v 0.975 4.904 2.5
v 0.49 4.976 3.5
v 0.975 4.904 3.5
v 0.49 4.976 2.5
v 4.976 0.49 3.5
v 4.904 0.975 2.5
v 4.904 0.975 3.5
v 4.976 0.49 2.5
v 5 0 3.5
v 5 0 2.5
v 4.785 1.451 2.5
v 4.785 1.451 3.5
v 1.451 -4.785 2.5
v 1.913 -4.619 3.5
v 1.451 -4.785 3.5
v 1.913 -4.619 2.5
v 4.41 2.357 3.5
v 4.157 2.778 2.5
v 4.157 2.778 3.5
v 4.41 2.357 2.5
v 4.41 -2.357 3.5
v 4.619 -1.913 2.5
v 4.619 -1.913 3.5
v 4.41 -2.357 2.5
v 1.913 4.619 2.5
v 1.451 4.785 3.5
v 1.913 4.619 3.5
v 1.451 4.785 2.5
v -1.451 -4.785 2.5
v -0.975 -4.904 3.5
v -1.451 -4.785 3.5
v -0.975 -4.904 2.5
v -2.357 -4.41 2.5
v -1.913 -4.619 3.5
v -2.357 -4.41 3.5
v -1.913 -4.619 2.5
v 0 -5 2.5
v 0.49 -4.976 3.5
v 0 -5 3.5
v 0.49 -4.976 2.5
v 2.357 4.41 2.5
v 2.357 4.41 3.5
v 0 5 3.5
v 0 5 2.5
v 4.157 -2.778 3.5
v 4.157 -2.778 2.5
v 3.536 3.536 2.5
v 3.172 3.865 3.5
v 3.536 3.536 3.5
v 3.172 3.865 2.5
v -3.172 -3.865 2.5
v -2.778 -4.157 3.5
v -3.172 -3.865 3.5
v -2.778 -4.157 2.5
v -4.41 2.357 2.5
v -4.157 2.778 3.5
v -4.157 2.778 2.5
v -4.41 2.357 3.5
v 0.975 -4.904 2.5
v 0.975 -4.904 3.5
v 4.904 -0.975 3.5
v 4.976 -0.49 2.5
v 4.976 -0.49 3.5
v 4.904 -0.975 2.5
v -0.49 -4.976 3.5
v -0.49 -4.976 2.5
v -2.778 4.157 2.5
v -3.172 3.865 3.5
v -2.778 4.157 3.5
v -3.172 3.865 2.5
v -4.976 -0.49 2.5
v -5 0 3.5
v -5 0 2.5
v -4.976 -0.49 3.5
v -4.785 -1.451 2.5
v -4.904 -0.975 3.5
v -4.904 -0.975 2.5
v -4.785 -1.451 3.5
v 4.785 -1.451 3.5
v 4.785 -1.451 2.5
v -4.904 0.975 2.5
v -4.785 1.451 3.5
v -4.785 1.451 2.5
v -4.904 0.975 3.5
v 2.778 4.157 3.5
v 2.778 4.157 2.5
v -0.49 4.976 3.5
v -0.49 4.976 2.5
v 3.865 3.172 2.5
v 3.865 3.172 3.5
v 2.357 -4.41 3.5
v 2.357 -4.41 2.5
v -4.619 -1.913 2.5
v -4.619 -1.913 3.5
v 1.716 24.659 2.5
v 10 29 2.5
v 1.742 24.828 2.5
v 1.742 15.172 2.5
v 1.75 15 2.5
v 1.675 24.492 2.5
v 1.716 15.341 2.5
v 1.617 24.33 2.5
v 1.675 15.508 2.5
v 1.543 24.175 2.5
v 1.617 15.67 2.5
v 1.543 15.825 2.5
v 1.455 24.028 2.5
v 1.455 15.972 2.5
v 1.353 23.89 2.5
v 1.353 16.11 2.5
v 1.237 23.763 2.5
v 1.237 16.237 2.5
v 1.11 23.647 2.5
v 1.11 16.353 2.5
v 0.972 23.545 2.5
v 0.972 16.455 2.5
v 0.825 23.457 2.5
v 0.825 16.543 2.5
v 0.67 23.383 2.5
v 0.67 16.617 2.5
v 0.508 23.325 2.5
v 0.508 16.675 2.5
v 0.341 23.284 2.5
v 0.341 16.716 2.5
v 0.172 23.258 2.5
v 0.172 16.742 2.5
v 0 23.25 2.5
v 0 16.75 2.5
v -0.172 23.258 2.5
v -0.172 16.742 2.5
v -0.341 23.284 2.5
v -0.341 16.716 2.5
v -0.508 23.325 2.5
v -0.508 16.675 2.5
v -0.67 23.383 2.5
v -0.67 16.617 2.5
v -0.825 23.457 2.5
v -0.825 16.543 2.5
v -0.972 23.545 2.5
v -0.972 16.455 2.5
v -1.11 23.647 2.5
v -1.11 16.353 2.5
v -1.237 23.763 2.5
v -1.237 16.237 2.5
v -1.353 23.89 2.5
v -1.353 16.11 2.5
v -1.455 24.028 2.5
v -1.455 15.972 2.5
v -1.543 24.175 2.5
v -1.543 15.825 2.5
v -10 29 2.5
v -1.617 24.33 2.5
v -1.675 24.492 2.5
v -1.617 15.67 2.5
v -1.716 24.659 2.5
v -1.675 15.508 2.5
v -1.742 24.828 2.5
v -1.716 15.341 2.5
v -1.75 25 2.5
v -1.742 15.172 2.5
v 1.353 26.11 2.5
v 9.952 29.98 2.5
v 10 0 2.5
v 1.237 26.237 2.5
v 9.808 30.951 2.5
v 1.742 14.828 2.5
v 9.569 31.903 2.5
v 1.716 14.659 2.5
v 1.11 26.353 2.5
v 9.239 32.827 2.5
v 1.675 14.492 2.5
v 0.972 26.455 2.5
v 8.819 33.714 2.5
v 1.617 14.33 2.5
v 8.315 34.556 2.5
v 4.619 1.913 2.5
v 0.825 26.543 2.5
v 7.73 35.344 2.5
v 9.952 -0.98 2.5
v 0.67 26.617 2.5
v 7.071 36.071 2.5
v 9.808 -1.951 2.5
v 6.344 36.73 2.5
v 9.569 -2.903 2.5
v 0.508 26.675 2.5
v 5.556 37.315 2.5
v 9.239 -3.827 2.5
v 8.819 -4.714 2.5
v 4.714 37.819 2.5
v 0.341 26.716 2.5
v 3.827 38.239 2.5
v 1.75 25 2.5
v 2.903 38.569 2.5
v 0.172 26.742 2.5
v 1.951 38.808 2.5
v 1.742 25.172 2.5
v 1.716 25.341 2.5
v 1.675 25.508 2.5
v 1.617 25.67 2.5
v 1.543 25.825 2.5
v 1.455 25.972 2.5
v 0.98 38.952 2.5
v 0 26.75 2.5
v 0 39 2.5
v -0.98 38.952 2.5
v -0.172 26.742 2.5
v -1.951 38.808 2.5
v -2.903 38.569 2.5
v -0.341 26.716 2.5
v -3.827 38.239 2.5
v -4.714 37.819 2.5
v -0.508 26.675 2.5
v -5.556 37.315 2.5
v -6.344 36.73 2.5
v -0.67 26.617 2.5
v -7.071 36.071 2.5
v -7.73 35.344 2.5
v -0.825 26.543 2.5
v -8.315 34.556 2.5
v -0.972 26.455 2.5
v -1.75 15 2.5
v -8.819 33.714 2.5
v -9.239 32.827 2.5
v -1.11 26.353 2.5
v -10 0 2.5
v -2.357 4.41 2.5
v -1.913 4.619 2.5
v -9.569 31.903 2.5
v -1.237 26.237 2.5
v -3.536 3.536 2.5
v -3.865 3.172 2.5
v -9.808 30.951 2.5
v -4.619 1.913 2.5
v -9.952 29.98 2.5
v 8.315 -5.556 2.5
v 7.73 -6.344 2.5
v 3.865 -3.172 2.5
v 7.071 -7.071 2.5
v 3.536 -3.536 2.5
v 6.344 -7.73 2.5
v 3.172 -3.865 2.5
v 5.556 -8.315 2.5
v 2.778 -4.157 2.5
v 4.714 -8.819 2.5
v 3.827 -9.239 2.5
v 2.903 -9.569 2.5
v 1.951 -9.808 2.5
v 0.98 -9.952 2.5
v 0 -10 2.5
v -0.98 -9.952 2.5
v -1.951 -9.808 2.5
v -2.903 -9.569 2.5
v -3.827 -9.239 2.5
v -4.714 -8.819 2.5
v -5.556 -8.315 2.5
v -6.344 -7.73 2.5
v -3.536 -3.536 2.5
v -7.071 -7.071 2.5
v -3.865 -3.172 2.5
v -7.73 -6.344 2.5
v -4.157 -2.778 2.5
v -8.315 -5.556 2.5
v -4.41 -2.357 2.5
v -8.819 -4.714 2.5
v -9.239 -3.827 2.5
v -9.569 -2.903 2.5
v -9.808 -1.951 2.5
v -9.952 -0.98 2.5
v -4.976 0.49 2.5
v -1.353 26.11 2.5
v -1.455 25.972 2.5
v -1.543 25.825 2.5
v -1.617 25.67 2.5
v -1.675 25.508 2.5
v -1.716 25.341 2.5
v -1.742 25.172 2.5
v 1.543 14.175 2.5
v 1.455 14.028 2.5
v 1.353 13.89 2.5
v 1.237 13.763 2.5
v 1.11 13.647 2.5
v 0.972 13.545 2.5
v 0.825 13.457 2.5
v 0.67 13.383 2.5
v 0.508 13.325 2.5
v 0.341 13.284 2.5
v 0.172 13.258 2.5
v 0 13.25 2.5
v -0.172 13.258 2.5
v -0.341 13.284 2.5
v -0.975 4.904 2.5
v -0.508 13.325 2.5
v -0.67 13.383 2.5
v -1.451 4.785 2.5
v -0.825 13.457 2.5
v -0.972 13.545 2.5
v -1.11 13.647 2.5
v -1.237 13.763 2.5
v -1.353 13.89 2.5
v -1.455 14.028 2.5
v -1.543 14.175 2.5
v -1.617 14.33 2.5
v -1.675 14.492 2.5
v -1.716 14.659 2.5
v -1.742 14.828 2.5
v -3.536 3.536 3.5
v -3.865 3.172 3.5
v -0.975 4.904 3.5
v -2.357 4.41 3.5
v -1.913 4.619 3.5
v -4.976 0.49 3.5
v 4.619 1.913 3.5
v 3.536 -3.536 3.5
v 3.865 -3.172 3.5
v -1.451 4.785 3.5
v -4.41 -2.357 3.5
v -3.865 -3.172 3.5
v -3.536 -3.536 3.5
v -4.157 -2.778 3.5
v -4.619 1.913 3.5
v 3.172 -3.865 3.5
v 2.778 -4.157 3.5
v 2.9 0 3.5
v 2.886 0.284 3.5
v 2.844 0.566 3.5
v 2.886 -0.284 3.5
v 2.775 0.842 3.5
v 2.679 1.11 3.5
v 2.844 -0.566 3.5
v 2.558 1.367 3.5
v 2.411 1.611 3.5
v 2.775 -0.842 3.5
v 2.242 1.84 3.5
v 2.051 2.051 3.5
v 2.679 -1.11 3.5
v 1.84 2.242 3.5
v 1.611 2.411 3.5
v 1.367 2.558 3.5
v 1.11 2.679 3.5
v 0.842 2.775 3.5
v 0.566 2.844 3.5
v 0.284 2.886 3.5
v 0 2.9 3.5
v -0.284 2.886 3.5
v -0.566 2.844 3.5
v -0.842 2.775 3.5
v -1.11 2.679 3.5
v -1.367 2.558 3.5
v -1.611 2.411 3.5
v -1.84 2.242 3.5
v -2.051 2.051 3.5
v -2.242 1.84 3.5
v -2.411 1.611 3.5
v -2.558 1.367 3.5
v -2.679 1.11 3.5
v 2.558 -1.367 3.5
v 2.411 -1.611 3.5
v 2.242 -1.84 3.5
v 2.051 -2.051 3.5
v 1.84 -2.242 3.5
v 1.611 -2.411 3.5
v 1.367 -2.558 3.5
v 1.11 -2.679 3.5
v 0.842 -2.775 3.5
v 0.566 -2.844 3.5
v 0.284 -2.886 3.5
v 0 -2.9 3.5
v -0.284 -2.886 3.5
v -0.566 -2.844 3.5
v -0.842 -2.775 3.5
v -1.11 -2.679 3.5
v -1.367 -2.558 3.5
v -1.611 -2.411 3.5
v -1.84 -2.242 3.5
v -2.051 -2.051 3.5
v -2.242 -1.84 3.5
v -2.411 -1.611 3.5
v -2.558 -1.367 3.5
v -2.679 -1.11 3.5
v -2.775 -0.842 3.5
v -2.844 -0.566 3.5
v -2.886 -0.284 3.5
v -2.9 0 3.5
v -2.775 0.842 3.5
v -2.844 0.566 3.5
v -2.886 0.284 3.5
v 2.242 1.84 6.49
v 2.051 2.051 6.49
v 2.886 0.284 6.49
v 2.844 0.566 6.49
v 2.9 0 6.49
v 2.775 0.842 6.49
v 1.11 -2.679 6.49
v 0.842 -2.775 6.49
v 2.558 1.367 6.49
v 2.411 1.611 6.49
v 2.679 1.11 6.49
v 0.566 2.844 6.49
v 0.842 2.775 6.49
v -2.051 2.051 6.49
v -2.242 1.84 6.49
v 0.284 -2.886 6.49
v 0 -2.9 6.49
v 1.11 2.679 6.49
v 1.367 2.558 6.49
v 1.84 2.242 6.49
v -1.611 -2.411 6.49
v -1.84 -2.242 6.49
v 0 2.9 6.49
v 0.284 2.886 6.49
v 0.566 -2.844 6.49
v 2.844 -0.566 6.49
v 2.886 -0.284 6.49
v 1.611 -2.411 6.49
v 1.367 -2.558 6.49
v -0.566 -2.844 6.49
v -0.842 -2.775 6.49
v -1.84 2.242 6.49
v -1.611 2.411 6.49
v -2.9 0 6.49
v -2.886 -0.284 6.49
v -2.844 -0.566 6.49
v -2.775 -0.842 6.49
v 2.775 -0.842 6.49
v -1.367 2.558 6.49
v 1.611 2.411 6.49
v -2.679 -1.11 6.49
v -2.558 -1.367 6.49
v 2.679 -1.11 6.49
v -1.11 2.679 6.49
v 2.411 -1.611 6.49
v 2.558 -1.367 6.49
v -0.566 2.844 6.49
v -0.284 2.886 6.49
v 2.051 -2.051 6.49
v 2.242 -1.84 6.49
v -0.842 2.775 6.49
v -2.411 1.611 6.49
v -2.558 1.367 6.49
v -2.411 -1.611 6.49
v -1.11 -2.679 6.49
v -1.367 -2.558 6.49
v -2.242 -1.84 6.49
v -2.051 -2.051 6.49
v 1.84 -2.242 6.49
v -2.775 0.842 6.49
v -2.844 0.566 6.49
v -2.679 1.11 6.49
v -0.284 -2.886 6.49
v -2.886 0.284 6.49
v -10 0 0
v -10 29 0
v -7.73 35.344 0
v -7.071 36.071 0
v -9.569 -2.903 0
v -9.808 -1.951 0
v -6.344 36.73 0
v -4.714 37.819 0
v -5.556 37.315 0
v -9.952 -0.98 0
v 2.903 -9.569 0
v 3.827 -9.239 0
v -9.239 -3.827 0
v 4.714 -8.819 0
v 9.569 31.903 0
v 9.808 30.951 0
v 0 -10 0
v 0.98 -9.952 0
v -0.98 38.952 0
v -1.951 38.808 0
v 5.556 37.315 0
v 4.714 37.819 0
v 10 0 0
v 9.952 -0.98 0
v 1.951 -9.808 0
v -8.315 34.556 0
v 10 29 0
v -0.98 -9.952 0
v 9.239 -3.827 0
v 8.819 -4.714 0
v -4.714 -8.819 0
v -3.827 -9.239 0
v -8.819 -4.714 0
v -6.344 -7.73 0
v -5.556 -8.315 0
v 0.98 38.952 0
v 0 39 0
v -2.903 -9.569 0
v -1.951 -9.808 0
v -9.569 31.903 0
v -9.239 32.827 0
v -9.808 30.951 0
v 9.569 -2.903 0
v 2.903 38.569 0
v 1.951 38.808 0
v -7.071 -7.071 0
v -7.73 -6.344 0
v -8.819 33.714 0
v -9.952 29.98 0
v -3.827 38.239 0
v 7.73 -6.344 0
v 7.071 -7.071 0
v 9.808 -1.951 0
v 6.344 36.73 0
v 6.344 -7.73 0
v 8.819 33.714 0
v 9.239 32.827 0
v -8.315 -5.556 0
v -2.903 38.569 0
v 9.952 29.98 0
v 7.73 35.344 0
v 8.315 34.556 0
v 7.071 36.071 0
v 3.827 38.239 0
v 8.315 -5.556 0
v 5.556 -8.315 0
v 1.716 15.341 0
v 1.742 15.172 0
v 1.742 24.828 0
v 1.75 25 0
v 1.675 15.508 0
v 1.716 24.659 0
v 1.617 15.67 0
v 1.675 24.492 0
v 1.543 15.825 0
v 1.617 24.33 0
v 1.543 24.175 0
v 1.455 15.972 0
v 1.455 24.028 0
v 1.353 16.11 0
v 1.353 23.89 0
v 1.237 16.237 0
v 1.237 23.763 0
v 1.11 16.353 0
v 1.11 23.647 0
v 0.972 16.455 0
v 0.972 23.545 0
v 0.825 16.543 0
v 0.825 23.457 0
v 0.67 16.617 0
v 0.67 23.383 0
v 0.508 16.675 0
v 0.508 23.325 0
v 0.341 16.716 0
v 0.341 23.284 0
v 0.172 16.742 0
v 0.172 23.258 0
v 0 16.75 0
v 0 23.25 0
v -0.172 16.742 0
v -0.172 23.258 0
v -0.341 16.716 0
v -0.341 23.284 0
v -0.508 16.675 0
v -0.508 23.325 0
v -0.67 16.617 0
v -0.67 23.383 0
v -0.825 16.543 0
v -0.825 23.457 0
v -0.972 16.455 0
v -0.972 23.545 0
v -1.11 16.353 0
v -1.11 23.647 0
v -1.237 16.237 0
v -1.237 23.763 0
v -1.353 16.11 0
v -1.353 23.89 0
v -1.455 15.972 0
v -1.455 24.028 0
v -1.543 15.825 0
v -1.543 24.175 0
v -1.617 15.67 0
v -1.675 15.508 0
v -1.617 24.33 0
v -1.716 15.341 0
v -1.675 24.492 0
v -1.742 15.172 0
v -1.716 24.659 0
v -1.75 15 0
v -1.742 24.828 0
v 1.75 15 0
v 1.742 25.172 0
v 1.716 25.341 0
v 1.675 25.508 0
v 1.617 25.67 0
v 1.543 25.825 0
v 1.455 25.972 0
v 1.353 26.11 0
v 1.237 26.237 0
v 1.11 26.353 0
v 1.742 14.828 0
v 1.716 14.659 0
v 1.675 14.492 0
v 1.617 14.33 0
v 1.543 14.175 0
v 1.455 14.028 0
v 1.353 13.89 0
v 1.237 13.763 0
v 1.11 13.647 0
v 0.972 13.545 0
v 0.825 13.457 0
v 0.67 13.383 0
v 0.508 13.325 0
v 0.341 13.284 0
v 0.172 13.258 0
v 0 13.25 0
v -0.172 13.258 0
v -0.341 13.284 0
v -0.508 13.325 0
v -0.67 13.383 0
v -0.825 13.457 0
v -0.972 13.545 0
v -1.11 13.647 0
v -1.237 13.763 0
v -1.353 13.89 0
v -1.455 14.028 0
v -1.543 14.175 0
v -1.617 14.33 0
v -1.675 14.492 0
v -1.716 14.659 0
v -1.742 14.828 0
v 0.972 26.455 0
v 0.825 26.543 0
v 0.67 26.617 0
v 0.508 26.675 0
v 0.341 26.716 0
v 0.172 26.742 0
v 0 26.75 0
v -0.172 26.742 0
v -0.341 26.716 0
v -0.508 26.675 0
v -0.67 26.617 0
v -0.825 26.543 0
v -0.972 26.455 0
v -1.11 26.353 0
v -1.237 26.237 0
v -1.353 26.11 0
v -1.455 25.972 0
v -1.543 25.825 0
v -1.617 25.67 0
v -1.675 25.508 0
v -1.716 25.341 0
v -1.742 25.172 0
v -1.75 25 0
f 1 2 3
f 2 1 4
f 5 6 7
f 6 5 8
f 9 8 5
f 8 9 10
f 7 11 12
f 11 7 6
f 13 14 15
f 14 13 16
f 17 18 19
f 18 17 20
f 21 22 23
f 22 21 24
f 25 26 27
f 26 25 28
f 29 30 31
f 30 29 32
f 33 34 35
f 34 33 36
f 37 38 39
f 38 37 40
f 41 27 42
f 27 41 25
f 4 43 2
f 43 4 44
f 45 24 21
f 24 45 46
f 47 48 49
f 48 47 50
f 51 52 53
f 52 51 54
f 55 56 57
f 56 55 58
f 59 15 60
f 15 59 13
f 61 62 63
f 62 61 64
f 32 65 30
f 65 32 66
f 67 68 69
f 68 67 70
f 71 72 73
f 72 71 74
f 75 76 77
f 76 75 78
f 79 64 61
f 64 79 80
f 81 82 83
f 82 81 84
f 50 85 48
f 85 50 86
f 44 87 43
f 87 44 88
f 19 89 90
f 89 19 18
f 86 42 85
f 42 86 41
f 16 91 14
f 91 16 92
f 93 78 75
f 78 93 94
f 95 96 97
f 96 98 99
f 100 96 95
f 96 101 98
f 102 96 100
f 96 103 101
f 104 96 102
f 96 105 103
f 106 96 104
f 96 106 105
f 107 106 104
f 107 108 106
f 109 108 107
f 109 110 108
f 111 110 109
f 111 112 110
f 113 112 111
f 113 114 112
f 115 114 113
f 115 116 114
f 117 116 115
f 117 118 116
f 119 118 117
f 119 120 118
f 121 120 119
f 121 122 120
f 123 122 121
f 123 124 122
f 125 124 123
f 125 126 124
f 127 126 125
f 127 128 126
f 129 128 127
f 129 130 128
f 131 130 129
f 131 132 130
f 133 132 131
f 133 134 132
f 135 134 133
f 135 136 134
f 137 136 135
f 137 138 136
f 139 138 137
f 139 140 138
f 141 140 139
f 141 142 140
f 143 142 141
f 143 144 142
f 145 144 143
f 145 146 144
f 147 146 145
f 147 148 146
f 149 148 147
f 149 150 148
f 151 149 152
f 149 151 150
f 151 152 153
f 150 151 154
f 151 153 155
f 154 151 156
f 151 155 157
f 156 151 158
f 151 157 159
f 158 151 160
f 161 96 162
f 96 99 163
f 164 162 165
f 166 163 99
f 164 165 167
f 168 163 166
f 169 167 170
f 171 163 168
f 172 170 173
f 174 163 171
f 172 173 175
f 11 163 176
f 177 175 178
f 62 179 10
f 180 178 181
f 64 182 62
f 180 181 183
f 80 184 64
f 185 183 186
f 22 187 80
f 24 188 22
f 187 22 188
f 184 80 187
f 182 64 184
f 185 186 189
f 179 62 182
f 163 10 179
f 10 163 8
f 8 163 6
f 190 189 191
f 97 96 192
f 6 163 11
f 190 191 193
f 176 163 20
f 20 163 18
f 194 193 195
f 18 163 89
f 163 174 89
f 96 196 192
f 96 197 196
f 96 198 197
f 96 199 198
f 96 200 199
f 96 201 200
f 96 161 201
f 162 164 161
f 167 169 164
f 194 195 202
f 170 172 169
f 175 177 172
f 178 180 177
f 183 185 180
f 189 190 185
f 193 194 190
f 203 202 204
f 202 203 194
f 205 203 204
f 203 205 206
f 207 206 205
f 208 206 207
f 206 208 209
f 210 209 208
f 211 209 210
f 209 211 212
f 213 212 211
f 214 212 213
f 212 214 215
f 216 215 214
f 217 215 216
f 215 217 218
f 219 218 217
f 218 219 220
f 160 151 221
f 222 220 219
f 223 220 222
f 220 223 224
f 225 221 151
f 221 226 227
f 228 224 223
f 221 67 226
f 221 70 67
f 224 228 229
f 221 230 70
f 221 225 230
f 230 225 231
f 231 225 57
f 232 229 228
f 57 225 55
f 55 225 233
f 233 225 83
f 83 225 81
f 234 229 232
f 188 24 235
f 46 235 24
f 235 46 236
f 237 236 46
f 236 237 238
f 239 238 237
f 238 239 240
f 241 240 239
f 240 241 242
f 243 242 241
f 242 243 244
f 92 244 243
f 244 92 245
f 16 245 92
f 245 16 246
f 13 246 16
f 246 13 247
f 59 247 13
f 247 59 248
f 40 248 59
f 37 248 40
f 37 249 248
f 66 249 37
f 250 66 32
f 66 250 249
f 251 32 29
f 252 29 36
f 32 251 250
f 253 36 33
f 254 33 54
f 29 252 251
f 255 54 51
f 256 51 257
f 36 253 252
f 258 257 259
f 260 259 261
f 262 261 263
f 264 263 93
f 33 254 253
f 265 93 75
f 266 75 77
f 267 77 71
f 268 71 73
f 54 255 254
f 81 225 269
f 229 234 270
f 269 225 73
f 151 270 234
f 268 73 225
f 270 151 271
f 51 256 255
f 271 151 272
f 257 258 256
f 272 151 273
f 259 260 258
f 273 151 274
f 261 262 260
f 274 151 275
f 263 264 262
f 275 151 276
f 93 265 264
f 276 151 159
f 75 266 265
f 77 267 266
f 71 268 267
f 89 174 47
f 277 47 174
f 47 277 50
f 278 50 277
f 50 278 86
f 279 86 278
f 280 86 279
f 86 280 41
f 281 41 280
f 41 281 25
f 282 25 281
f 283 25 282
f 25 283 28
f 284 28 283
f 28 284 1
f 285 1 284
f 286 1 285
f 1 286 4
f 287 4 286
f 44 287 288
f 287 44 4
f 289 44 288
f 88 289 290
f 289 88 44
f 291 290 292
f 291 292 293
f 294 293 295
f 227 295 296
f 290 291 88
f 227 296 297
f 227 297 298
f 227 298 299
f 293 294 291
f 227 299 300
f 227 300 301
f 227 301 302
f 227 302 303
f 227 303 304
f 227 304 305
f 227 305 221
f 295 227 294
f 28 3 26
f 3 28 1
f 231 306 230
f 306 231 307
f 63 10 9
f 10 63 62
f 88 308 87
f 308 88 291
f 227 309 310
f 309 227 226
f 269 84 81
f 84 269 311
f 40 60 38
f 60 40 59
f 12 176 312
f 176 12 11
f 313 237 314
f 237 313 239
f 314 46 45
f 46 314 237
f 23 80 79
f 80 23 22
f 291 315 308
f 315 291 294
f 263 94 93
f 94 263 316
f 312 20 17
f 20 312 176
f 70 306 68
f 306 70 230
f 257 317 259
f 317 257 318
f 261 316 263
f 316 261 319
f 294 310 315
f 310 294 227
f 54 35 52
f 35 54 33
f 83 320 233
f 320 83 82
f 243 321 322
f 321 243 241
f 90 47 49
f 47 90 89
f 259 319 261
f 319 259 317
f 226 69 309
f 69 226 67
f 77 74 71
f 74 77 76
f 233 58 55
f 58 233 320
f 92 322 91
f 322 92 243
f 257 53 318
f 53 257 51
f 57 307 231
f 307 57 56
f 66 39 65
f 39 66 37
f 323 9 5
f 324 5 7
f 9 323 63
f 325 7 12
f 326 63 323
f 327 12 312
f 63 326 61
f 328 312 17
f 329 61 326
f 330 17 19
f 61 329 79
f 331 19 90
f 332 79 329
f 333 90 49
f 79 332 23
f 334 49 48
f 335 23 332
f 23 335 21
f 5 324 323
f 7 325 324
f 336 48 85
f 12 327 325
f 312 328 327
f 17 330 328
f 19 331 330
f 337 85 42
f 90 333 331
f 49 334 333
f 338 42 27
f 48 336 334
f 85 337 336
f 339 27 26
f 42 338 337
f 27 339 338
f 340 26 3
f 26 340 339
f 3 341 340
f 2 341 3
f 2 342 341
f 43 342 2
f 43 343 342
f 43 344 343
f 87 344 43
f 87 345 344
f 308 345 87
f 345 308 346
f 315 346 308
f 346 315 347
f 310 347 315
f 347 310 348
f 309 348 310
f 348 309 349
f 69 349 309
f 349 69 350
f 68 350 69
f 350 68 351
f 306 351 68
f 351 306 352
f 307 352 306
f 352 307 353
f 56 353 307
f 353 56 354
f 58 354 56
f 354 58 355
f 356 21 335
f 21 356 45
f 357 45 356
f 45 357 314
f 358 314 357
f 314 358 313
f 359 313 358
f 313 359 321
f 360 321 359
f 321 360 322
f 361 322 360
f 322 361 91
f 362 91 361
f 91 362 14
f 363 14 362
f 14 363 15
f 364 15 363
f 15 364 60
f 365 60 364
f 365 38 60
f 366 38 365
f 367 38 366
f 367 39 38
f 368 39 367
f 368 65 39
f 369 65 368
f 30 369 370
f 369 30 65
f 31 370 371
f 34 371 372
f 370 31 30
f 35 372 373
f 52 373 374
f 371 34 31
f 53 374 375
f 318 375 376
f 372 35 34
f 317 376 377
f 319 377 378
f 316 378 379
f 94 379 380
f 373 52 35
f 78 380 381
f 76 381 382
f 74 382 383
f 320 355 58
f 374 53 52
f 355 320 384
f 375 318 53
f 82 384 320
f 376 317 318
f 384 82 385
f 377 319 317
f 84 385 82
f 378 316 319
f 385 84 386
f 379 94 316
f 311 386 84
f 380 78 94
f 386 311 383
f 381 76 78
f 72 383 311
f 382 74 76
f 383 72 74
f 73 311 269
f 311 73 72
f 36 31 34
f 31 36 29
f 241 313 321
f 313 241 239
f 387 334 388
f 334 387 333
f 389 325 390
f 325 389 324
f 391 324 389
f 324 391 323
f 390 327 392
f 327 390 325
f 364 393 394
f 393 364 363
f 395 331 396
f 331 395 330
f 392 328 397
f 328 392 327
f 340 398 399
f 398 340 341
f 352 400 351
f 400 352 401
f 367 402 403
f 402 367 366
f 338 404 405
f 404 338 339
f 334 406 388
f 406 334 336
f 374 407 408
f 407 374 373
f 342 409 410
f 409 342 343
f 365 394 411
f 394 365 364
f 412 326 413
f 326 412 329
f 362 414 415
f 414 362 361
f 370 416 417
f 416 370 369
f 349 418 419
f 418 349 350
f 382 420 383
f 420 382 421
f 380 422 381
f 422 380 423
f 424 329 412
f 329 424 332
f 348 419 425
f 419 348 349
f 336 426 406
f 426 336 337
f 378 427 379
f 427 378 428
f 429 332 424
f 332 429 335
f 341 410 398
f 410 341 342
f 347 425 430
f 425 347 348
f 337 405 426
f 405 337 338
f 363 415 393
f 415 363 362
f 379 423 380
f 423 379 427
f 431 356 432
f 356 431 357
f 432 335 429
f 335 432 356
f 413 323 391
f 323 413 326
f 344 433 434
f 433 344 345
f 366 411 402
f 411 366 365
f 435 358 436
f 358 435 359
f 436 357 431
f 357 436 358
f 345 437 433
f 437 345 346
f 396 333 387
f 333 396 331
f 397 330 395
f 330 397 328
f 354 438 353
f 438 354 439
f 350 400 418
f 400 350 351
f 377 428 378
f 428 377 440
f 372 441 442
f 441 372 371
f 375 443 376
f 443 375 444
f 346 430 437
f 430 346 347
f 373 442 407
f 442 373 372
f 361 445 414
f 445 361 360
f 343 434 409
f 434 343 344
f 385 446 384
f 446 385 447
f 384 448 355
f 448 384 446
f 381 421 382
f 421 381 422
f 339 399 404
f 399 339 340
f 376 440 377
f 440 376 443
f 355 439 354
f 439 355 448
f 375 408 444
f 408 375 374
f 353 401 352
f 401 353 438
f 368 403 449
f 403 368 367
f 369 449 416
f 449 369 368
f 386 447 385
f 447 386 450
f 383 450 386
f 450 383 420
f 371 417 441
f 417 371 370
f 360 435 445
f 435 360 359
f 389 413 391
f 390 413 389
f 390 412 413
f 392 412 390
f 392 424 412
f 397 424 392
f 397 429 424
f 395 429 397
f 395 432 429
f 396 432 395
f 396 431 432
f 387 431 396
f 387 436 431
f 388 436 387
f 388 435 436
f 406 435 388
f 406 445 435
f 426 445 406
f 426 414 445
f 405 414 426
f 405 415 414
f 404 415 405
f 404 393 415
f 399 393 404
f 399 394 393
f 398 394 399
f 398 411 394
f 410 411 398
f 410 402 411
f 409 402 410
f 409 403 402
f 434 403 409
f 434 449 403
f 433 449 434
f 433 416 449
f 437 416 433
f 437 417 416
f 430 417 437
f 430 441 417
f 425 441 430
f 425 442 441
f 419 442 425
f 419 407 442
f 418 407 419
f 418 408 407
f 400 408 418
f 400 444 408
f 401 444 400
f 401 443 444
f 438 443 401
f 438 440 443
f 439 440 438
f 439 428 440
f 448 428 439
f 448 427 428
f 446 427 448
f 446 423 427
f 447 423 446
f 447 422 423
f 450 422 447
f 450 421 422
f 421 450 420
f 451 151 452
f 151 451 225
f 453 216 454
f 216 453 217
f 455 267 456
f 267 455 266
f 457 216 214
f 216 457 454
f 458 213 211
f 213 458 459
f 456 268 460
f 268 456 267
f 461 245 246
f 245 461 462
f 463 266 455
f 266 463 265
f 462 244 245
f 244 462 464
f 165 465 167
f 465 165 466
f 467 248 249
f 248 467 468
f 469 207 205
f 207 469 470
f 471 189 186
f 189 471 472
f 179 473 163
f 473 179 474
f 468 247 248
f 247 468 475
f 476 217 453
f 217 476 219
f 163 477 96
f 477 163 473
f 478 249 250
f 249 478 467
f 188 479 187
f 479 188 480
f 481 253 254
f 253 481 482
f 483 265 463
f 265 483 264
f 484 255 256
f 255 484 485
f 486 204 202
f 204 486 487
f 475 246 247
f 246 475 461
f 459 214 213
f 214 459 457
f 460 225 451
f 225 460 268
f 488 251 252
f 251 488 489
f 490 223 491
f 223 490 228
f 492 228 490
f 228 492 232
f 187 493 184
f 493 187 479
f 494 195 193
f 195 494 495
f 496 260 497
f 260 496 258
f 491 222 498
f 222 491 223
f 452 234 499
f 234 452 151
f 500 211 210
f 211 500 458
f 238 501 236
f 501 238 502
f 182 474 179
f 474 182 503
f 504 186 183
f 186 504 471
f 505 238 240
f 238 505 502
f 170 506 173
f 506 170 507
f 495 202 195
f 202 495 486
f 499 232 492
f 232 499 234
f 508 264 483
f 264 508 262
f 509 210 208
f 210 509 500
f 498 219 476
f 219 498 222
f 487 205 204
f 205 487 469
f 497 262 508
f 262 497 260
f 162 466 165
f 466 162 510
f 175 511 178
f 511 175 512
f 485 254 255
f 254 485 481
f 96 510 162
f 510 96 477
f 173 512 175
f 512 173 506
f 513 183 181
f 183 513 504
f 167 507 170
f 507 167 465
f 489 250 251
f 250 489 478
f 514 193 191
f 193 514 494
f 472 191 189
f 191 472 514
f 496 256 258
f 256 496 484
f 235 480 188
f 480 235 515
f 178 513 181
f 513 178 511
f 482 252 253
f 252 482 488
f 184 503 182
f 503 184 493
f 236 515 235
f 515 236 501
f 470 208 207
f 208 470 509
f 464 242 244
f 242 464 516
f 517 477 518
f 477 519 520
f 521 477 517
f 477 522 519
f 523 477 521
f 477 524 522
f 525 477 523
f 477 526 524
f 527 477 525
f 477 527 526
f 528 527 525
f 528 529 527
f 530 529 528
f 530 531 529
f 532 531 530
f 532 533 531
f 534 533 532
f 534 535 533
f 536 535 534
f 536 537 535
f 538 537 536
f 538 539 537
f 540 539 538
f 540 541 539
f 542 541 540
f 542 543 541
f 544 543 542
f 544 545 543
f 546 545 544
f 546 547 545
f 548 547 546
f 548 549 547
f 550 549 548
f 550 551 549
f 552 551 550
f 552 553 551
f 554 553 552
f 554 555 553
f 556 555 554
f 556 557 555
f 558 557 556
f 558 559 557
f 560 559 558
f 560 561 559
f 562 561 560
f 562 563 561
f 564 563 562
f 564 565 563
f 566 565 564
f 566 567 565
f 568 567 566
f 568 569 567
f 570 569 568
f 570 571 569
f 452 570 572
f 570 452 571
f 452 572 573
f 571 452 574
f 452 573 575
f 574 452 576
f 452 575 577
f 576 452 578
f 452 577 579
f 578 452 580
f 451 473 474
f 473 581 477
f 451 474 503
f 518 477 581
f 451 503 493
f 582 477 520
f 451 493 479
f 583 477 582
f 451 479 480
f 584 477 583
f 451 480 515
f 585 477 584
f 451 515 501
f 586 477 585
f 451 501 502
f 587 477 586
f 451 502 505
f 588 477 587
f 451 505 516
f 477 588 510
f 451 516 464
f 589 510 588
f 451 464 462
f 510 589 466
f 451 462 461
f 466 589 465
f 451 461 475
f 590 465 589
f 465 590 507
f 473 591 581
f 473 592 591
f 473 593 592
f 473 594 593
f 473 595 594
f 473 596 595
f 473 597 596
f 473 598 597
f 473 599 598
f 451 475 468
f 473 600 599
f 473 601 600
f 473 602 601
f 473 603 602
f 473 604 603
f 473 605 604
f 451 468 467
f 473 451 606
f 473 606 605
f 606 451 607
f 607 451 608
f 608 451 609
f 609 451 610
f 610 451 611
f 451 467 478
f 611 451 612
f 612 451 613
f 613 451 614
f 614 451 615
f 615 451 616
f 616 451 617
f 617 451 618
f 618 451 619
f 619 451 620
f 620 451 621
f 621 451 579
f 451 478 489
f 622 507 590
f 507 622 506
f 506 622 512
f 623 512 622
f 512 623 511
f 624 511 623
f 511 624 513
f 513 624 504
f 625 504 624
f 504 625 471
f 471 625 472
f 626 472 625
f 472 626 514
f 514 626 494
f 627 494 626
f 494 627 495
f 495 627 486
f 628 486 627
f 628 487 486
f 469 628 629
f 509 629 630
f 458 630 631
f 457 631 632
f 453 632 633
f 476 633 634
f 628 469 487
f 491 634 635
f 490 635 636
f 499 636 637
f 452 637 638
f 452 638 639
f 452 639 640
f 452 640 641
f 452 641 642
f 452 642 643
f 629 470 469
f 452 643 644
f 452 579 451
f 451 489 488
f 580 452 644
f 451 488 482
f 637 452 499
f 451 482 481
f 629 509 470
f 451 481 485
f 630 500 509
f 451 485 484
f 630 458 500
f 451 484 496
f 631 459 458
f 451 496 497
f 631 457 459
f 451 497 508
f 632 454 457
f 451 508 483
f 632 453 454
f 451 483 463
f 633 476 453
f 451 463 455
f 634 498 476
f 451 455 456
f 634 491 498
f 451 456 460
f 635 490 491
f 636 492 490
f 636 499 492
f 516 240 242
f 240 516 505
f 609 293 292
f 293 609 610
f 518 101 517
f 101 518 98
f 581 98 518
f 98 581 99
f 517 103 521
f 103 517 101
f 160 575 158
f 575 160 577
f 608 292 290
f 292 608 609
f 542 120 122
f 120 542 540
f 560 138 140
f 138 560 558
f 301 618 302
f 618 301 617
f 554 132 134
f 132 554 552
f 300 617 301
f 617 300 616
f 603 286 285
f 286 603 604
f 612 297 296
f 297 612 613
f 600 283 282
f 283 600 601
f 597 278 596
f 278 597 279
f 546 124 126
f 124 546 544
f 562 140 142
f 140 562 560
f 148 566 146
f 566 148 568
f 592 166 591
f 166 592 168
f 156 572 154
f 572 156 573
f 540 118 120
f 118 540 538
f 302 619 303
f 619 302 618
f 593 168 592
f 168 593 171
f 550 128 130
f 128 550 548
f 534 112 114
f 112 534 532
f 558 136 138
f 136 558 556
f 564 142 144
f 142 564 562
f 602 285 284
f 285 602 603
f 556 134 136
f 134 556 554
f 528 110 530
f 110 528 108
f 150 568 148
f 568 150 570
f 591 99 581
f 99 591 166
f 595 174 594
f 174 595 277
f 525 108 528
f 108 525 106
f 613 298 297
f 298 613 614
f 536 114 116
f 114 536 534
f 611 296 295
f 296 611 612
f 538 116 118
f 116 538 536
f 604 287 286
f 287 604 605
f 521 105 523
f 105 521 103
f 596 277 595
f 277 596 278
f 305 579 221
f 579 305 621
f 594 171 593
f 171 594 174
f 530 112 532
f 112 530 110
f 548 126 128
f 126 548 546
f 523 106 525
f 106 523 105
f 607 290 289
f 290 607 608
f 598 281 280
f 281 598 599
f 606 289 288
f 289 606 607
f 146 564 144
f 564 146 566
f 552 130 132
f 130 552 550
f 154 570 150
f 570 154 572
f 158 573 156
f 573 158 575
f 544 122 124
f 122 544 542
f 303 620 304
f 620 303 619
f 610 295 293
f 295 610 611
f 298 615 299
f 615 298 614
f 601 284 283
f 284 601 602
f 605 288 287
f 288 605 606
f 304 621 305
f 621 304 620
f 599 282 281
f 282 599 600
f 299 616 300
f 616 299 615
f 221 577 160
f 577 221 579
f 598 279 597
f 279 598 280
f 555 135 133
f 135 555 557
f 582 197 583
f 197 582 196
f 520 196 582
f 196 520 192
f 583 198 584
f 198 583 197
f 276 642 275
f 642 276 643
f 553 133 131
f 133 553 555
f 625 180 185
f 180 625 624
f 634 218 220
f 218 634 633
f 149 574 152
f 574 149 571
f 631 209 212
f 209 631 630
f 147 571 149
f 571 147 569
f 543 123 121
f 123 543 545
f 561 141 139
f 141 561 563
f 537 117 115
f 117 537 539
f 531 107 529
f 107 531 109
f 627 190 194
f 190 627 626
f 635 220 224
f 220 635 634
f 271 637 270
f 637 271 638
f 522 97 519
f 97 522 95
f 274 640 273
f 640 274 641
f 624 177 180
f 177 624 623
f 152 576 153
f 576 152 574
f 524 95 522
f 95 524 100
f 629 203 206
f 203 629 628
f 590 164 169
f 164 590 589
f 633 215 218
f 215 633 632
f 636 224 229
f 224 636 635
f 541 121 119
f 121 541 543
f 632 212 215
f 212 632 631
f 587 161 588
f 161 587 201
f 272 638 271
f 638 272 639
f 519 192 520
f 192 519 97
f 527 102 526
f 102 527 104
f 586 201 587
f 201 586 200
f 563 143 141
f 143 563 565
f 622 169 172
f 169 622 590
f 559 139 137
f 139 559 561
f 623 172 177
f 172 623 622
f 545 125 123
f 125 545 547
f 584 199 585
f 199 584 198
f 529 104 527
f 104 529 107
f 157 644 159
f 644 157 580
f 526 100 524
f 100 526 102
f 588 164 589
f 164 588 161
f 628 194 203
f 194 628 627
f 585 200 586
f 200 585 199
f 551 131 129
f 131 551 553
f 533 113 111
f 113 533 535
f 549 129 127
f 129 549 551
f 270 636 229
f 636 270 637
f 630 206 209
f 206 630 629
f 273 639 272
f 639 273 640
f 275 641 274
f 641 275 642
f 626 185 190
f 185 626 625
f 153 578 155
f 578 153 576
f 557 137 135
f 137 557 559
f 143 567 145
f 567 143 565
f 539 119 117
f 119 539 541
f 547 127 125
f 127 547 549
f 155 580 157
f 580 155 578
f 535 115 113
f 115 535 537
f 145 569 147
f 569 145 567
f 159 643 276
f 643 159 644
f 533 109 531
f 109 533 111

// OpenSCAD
// file: subpieces/articulation-axis.scad
articulationAxisSubPiece();

/**
 * articulationAxisSubPiece
 * @name articulationAxisSubPiece
 * @description articlulation axis
 * @type subPiece
 */

module articulationAxisSubPiece(
    base_diameter,
    base_height,
    axis_diameter,
    axis_height,
    _fn = 64
) {
    cylinder(
        r = base_diameter / 2,
        h = base_height,
        $fn = _fn
    );
    translate(
        [
            0,
            0,
            base_height
        ]
    )
        cylinder(
            r = axis_diameter / 2,
            h = axis_height,
            $fn = _fn
        );

}
// file: ../envelopes/servo-envelope.scad
servoEnvelope();

// Enveloppe for servo holes fixations
// Around the servo motor and the fixation holes

module servoEnvelope(
    servo_hole_scale = 1,
    screw_hole_diameter = 2
) {

    servo_length = 22.2;
    servo_width = 11.8;
    servo_height = 22.7;

    // translating to center the servo motor envelope as servo
    scale(servo_hole_scale)
        translate([-servo_width / 2, - servo_length + (servo_width / 2), -servo_height/2])
            cube([servo_width, servo_length, servo_height], center = false);    

    
    translate([-servo_width / 2, - servo_length + (servo_width / 2), -servo_height/2]) {
        translate([servo_width / 2, - 2.3, 0])
            cylinder(h = servo_height, r = 1, center = false, $fn = 16);

        translate([servo_width / 2, servo_length + 2.3, 0])
            cylinder(h = servo_height, r = 1, center = false, $fn = 16);
    }
}
// main file
use <../envelopes/servo-envelope.scad>
use <./subpieces/articulation-axis.scad>


/**
 * LegPieceE
 * @name LegPieceE
 * @description Leg Piece E
 * @type piece
 * @parent LegComponent
 * @stl
 */
module legPieceE(
    length = 29,
    screw_hole_offset_1 = 15,
    screw_hole_offset_2 = 25,
) {

    screw_hole_diameter = 3.5;

    _fn = 64;
    width = 10;
    thickness = 2.5;

    support_diameter = 12;
    support_thickness = 0.0;
    
    articluation_axis_diameter_offest = 0.2;

    difference() {

        union() {

            hull() {
                cylinder(h = thickness, r = width, center = false, $fn = _fn);
                translate([0, length, 0])
                cylinder(h = thickness, r = width, center = false, $fn = _fn);
            }
            
            translate([0, 0, thickness]) {
                cylinder(h = support_thickness, r = support_diameter / 2, center = false, $fn = _fn);
                translate([0, 0, support_thickness])
                    rotate([0, 0, 0])
                        articulationAxisSubPiece(
                            base_diameter = 10,
                            base_height = 1,
                            axis_diameter = 6 - articluation_axis_diameter_offest,
                            axis_height = 3 - 0.01
                        );
            }
        }
        
        translate([0, screw_hole_offset_1, thickness / 2])
            cylinder(h = thickness * 2, r = screw_hole_diameter / 2, center = true, $fn = _fn);

        translate([0, screw_hole_offset_2, thickness / 2])
            cylinder(h = thickness * 2, r = screw_hole_diameter / 2, center = true, $fn = _fn);

    }
}


/**
 * @stl
 * @png
 * @colorscheme BeforeDawn
 * @view axes,scales
 */
legPieceE();
